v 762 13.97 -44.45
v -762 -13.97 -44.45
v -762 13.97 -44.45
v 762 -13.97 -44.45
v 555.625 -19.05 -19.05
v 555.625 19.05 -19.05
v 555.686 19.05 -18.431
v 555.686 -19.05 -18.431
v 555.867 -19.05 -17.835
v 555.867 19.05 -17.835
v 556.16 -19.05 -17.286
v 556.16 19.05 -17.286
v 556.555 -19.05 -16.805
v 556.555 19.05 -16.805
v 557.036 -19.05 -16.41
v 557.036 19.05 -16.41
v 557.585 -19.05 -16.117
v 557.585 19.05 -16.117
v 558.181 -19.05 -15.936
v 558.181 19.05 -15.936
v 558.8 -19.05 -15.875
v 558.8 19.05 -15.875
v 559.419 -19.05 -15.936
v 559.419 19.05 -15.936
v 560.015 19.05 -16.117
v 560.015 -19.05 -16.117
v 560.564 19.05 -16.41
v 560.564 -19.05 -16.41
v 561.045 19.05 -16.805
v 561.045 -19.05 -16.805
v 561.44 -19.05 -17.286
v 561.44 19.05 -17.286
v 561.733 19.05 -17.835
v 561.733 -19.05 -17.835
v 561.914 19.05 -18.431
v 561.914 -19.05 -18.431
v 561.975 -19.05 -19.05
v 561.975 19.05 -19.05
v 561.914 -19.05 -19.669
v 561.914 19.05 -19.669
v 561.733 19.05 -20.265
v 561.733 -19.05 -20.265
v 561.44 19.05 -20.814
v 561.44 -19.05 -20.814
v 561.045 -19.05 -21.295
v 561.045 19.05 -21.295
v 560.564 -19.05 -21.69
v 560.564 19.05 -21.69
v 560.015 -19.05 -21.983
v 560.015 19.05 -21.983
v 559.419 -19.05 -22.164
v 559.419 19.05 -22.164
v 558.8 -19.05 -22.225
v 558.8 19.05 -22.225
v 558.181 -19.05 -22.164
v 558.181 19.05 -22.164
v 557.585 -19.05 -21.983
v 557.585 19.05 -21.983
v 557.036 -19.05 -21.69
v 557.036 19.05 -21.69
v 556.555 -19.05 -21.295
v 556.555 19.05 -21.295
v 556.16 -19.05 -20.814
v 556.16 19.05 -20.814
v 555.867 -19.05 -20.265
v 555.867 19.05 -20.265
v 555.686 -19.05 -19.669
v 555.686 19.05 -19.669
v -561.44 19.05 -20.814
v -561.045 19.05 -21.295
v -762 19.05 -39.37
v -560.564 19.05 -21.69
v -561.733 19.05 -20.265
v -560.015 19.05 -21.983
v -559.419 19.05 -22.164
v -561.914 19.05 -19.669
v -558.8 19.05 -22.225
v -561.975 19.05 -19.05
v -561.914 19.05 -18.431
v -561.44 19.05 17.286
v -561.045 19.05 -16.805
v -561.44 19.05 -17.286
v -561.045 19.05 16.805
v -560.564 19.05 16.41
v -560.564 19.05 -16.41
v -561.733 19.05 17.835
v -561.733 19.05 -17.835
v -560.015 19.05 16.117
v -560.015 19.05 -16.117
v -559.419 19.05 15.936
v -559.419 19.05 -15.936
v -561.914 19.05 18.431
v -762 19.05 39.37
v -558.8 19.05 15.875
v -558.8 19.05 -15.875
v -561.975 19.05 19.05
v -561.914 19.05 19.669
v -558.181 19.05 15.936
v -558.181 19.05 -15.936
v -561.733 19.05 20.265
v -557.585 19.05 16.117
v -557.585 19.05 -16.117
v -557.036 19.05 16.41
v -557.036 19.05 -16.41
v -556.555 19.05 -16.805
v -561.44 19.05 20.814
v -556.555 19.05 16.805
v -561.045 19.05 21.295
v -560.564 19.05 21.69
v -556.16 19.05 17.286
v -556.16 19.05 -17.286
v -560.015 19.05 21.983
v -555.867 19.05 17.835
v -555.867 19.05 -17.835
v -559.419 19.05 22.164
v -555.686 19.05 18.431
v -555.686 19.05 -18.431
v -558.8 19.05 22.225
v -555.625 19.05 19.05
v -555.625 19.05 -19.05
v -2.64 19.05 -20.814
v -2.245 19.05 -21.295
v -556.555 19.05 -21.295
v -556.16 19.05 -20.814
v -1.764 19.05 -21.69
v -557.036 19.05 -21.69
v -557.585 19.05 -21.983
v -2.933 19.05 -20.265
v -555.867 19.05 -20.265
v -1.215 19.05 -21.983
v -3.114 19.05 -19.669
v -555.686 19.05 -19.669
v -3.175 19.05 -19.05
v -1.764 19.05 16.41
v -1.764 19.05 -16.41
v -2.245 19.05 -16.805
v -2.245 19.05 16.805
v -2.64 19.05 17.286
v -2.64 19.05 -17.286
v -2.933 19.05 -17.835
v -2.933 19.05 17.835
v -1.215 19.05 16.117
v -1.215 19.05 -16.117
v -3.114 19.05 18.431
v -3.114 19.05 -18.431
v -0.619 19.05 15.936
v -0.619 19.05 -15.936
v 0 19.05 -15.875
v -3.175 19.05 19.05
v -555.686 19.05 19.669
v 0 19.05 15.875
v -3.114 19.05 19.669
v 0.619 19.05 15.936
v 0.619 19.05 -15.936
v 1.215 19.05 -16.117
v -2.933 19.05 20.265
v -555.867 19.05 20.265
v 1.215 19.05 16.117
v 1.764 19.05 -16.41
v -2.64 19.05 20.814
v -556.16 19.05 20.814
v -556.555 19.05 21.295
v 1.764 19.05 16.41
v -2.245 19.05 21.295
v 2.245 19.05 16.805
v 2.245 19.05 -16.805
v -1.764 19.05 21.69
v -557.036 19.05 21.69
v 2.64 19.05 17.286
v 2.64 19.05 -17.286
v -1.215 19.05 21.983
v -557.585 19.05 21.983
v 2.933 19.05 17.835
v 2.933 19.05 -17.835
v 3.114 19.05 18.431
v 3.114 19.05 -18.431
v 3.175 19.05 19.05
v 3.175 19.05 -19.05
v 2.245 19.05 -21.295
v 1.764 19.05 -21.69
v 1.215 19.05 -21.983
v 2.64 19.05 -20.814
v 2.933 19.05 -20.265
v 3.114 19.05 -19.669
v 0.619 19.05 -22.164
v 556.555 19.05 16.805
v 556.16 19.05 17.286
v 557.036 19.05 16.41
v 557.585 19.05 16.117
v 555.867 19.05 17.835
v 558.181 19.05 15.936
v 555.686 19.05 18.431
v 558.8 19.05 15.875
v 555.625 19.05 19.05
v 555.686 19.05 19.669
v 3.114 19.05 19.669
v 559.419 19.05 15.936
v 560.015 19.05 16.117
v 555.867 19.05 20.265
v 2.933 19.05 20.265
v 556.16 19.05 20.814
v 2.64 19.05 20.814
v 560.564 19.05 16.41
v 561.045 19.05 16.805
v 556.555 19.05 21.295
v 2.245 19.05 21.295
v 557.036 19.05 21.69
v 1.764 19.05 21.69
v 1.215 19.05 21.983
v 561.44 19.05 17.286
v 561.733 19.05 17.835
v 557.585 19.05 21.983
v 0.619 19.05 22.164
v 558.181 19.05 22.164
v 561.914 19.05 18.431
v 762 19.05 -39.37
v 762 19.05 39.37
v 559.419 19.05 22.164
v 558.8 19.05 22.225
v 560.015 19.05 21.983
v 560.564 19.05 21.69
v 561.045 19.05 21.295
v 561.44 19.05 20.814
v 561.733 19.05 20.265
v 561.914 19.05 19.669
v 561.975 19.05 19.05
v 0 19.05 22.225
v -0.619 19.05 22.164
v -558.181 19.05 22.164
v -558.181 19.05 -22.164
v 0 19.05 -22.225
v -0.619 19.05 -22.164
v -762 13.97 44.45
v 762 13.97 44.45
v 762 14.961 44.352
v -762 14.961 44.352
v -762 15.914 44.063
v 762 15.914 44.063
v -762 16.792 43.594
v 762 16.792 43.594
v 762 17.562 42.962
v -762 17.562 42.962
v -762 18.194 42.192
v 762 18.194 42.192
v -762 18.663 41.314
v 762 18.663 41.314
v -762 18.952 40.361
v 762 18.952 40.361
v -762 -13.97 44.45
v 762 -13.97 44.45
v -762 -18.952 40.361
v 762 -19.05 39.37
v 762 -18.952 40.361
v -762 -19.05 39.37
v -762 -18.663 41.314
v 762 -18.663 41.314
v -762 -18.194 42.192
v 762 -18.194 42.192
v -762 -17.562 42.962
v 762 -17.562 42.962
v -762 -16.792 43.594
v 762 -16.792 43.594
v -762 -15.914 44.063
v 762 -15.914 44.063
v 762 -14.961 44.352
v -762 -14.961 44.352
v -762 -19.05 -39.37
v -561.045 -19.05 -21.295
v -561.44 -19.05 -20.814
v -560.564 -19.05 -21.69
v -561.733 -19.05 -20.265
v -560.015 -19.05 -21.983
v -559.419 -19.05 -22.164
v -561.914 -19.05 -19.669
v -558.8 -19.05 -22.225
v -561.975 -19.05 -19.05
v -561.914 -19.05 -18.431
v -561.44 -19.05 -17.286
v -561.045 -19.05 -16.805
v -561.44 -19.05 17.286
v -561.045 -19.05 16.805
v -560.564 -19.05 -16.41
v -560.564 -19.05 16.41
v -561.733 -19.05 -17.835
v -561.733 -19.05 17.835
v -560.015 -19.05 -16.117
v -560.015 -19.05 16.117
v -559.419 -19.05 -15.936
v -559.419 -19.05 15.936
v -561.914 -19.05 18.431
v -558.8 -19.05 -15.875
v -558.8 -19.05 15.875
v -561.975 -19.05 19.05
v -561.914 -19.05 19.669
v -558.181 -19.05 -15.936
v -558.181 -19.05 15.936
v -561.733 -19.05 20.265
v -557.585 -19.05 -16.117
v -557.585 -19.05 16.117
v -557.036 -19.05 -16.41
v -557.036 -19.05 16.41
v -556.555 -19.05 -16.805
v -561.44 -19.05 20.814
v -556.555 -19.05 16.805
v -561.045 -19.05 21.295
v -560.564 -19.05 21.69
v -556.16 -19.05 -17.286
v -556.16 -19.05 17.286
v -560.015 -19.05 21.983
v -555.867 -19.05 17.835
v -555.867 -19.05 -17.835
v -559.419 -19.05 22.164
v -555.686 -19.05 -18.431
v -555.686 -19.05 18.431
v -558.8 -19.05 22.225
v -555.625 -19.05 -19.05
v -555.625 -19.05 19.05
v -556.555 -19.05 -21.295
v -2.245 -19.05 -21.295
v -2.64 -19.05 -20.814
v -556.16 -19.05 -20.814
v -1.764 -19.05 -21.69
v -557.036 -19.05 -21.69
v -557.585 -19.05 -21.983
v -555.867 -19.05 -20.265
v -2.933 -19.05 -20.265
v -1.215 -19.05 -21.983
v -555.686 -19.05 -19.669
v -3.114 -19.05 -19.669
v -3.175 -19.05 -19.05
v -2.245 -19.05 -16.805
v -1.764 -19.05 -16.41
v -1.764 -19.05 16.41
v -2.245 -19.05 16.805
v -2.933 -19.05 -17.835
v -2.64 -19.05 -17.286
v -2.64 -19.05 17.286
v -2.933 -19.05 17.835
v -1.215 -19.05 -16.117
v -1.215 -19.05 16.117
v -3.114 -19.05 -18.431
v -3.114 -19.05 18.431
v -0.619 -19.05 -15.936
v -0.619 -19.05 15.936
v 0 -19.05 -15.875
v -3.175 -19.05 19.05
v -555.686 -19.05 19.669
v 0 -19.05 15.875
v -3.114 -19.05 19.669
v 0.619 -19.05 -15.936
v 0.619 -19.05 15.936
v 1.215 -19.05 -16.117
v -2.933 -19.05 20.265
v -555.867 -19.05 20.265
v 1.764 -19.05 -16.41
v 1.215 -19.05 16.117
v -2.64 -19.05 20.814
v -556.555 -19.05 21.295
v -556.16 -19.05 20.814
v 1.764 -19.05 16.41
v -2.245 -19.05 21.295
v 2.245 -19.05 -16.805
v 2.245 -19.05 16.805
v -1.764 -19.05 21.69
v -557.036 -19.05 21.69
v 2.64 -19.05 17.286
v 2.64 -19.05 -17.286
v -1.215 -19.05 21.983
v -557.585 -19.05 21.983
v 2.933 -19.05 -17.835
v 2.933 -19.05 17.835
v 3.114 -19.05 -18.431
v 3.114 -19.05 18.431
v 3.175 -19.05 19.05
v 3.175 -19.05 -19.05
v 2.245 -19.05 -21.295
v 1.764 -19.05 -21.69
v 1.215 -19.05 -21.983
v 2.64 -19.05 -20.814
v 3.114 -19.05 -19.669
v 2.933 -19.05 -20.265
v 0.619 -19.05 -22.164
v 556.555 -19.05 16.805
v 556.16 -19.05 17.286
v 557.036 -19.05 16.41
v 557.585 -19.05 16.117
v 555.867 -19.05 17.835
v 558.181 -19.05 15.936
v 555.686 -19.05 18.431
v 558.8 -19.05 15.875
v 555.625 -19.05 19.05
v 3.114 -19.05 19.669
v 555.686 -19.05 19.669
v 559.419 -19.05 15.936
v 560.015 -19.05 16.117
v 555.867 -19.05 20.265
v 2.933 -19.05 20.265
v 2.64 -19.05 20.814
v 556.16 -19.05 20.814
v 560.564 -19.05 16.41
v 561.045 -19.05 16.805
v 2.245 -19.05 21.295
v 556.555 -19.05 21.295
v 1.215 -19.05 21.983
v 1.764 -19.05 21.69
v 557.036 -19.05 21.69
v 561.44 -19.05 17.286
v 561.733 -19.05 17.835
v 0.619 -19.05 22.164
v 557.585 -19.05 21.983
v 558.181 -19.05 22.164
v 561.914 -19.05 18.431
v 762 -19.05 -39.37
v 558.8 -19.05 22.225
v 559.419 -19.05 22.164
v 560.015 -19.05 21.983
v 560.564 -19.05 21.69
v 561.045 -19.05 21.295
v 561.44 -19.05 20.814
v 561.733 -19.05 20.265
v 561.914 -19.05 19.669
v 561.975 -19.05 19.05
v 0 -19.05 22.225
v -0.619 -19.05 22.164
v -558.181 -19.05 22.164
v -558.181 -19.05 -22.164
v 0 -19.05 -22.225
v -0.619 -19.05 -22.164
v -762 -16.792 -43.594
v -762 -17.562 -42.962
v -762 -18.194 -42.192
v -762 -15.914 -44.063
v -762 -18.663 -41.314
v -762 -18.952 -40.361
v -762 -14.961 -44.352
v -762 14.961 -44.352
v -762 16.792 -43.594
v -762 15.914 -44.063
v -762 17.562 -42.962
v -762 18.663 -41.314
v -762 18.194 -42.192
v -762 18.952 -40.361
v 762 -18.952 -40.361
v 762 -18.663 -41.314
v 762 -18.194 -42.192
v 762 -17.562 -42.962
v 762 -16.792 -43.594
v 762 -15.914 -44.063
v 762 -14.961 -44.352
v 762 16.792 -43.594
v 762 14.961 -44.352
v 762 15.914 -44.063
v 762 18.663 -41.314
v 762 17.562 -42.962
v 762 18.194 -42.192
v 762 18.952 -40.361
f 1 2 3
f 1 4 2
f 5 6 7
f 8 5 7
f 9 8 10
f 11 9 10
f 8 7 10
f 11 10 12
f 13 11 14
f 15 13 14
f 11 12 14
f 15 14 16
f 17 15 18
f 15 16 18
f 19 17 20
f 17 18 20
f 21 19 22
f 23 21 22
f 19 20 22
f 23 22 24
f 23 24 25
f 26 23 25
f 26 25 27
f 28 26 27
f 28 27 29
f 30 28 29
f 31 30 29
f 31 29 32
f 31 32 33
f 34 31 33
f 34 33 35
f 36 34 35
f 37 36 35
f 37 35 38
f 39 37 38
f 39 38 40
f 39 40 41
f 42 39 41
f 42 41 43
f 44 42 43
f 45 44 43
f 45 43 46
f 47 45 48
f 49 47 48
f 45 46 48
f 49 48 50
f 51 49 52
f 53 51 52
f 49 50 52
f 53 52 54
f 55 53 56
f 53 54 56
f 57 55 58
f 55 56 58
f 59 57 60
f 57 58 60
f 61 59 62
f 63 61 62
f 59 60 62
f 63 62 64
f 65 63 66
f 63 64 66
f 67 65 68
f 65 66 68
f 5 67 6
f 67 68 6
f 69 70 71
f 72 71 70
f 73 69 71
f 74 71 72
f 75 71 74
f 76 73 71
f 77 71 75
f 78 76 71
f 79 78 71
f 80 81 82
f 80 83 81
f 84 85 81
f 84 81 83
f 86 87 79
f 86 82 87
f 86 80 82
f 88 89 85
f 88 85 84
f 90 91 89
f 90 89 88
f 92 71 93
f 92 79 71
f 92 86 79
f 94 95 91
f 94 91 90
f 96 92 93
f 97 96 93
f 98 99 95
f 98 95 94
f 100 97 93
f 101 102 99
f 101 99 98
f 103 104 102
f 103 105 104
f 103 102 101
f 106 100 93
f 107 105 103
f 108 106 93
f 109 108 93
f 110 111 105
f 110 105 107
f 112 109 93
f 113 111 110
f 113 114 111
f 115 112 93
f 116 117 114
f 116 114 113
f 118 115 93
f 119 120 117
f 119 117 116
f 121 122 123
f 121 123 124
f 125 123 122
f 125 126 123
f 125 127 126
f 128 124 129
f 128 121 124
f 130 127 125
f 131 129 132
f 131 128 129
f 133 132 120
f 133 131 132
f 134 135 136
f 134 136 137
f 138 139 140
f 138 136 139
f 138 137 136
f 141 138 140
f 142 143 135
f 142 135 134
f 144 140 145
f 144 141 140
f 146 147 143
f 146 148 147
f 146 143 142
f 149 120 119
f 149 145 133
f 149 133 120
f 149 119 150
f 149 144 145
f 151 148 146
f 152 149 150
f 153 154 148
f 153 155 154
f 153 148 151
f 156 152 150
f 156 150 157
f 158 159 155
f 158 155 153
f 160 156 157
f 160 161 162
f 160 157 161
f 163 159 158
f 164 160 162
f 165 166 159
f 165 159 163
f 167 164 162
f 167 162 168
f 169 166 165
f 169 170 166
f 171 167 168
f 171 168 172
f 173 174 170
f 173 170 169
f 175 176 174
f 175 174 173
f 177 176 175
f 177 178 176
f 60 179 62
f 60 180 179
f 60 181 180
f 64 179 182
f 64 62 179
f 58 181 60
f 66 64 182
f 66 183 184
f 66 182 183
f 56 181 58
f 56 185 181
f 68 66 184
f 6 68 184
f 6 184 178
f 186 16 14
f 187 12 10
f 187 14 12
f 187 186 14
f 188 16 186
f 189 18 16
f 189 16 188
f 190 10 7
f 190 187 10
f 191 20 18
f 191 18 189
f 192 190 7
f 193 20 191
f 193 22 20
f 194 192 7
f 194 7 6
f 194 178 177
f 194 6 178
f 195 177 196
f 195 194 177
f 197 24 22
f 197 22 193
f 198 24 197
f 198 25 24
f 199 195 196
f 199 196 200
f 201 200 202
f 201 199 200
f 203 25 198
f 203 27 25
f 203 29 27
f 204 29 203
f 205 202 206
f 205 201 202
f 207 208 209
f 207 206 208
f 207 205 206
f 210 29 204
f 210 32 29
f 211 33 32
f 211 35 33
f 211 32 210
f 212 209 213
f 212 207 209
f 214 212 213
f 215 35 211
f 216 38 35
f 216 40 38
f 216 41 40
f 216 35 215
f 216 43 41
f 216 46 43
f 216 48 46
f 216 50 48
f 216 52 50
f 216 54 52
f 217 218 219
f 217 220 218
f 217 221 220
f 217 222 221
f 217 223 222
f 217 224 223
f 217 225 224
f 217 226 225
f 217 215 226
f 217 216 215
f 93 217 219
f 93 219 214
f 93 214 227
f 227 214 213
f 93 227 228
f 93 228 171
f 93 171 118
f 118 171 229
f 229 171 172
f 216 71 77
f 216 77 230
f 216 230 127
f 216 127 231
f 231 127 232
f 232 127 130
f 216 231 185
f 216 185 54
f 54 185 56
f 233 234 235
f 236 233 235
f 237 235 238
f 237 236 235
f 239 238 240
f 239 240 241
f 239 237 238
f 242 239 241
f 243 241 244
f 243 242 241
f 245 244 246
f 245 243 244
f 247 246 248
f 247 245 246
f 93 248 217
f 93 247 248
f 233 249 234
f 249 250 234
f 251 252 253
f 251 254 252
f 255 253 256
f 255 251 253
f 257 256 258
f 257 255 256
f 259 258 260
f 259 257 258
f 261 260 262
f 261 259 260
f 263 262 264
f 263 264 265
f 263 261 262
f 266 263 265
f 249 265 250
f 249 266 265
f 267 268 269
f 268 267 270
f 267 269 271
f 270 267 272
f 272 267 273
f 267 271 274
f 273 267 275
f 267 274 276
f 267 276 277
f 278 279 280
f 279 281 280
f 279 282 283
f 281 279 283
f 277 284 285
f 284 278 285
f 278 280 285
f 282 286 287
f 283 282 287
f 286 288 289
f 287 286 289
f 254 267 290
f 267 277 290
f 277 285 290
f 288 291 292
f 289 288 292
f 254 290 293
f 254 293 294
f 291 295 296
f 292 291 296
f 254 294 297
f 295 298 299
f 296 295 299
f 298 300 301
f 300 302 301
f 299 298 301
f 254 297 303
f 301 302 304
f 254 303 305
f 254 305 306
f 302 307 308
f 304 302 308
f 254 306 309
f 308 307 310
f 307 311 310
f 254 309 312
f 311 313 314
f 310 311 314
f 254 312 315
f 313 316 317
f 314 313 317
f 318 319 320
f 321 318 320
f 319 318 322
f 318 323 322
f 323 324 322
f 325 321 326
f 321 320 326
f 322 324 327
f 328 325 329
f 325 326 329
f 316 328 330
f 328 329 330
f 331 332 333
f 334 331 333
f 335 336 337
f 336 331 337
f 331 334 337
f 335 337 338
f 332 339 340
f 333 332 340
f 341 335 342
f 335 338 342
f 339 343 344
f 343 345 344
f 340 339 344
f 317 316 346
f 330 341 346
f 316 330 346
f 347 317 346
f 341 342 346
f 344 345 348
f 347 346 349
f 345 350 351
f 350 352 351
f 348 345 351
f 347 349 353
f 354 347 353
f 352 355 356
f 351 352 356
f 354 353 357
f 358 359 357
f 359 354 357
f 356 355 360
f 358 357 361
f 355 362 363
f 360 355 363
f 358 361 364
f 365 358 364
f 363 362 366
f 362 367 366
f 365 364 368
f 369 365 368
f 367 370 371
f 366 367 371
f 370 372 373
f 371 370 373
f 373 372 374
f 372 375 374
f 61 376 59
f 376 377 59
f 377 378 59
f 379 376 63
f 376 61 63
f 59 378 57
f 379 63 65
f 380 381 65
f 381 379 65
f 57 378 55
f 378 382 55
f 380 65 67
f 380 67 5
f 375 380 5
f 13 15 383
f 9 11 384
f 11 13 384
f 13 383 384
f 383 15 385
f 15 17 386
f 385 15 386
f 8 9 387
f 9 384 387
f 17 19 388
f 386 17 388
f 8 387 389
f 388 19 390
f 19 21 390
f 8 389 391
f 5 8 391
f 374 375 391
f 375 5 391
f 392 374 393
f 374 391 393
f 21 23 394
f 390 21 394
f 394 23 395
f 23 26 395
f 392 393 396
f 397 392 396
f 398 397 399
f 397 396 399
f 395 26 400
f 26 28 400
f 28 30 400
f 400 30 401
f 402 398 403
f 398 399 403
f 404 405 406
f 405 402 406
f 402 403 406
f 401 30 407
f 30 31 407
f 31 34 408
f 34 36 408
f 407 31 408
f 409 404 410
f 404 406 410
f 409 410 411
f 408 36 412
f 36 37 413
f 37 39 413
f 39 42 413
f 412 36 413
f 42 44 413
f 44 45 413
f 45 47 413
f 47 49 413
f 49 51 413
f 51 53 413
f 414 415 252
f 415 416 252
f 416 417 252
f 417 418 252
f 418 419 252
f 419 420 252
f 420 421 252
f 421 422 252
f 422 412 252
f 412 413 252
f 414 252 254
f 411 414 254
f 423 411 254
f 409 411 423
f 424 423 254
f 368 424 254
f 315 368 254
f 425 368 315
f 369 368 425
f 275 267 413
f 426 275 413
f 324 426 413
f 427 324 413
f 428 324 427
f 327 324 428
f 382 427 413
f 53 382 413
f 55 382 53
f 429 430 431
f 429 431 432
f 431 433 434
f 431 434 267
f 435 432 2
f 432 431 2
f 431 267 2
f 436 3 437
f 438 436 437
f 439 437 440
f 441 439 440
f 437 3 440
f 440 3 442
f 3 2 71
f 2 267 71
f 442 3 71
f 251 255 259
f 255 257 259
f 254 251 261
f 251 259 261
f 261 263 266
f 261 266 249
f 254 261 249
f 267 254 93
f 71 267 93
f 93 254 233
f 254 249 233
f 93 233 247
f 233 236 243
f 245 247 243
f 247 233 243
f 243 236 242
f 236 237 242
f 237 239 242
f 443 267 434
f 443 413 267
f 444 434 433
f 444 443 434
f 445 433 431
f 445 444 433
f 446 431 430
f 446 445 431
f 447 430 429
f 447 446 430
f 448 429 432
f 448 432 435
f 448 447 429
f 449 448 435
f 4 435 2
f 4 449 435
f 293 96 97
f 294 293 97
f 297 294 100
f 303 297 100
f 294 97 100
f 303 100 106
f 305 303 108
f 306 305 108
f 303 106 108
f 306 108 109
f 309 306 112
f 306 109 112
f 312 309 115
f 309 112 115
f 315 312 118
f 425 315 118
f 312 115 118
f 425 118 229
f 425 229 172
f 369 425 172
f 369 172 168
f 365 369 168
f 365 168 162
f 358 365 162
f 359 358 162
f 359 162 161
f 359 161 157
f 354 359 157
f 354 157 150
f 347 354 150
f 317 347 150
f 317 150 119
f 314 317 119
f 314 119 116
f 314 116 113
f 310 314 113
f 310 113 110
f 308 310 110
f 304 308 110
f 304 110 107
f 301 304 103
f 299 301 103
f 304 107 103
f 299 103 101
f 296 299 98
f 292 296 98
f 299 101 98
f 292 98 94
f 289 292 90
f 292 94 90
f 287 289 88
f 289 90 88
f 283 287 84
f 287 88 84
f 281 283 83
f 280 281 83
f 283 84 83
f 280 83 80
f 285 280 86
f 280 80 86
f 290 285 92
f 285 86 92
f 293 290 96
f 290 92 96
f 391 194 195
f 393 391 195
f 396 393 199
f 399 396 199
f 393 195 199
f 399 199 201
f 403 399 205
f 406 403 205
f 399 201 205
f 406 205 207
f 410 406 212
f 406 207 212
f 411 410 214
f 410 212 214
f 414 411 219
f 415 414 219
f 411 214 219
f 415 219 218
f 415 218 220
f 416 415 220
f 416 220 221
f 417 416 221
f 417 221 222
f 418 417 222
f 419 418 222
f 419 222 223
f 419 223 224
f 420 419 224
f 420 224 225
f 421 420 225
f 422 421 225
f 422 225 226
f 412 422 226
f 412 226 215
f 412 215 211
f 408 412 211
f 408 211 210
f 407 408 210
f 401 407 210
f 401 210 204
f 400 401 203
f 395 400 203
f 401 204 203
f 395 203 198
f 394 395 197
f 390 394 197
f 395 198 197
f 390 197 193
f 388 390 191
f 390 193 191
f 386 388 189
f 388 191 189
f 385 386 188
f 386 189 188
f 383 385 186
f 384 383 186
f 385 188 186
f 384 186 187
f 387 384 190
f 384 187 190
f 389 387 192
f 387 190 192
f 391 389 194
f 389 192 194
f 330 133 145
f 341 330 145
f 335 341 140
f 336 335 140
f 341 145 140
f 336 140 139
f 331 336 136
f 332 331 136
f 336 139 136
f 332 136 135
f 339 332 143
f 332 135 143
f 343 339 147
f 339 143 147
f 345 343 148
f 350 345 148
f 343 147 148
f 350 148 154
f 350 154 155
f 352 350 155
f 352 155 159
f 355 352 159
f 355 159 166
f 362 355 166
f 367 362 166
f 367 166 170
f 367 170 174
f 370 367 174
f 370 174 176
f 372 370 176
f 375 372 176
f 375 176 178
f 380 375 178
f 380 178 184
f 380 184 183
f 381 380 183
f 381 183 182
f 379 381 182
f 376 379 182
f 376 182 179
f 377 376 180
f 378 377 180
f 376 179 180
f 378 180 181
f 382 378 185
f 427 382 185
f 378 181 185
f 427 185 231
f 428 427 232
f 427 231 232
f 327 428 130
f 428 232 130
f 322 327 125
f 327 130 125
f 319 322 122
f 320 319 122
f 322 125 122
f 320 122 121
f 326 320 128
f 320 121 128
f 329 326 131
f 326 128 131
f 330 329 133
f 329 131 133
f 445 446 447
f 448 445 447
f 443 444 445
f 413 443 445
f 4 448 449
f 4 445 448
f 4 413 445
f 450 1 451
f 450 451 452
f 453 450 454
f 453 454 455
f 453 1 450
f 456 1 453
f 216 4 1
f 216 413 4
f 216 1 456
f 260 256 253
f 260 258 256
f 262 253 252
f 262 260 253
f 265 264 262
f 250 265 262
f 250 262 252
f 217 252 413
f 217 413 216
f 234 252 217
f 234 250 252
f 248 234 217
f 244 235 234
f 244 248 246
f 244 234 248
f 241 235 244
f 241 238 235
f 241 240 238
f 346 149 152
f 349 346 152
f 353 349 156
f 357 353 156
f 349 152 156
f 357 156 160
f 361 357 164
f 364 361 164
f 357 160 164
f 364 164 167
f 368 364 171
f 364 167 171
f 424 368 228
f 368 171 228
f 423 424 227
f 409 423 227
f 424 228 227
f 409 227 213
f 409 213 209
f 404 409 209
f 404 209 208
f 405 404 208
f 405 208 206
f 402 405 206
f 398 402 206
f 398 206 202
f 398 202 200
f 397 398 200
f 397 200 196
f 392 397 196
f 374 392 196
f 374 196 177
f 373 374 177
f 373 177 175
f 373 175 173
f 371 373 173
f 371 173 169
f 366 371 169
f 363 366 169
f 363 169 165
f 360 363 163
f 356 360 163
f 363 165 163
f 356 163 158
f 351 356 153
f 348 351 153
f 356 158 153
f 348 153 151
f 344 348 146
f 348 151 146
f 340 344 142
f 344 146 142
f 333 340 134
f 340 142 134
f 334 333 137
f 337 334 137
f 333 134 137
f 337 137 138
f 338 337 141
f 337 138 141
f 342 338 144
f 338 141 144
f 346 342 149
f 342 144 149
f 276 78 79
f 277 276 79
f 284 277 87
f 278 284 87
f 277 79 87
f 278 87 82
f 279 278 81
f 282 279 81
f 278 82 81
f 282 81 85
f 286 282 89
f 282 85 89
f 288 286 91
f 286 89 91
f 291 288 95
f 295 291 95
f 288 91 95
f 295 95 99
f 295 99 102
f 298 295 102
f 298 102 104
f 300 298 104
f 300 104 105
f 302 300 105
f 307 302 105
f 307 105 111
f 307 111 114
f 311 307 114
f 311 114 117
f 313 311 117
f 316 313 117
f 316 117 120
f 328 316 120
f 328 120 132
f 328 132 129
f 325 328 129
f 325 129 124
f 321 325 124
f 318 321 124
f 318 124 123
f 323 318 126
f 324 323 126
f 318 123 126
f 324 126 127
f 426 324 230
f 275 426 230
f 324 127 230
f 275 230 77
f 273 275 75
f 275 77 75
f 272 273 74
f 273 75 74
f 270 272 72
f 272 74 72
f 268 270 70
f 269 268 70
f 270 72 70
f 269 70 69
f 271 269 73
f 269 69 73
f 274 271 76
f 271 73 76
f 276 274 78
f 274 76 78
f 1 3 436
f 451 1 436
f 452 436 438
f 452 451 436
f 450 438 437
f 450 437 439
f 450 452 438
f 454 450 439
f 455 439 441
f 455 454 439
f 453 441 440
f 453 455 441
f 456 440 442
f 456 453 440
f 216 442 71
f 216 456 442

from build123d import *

# Parameters (mm, degrees)
F0_W     = 38.1
F0_H     = 88.9
F1_DEPTH = 762
F3_D     = 6.35
F4_R     = 5.08
F6_D     = 6.35


with BuildPart() as f1:
    # F0 (on Right) → F1 (new body, symmetric)
    with BuildSketch(Plane.YZ):
        Rectangle(F0_W, F0_H)
    extrude(amount=F1_DEPTH, both=True)

    # F3 (through all)
    with Locations(Plane.XZ.offset(19.05)):
        with Locations((-558.8, 19.05), (-558.8, -19.05), (558.8, -19.05), (558.8, 19.05)):
            Hole(F3_D / 2)

    # F4
    f4_edges = [f1.edges().sort_by_distance(p)[0] for p in [
        (0, -19.05, 44.45),
        (0, 19.05, 44.45),
        (0, 19.05, -44.45),
        (0, -19.05, -44.45),
    ]]
    fillet(f4_edges, radius=F4_R)

    # F6 (through all)
    with Locations(Plane.XZ.offset(19.05)):
        with Locations((0, 19.05), (0, -19.05)):
            Hole(F6_D / 2)


solid = f1.part
